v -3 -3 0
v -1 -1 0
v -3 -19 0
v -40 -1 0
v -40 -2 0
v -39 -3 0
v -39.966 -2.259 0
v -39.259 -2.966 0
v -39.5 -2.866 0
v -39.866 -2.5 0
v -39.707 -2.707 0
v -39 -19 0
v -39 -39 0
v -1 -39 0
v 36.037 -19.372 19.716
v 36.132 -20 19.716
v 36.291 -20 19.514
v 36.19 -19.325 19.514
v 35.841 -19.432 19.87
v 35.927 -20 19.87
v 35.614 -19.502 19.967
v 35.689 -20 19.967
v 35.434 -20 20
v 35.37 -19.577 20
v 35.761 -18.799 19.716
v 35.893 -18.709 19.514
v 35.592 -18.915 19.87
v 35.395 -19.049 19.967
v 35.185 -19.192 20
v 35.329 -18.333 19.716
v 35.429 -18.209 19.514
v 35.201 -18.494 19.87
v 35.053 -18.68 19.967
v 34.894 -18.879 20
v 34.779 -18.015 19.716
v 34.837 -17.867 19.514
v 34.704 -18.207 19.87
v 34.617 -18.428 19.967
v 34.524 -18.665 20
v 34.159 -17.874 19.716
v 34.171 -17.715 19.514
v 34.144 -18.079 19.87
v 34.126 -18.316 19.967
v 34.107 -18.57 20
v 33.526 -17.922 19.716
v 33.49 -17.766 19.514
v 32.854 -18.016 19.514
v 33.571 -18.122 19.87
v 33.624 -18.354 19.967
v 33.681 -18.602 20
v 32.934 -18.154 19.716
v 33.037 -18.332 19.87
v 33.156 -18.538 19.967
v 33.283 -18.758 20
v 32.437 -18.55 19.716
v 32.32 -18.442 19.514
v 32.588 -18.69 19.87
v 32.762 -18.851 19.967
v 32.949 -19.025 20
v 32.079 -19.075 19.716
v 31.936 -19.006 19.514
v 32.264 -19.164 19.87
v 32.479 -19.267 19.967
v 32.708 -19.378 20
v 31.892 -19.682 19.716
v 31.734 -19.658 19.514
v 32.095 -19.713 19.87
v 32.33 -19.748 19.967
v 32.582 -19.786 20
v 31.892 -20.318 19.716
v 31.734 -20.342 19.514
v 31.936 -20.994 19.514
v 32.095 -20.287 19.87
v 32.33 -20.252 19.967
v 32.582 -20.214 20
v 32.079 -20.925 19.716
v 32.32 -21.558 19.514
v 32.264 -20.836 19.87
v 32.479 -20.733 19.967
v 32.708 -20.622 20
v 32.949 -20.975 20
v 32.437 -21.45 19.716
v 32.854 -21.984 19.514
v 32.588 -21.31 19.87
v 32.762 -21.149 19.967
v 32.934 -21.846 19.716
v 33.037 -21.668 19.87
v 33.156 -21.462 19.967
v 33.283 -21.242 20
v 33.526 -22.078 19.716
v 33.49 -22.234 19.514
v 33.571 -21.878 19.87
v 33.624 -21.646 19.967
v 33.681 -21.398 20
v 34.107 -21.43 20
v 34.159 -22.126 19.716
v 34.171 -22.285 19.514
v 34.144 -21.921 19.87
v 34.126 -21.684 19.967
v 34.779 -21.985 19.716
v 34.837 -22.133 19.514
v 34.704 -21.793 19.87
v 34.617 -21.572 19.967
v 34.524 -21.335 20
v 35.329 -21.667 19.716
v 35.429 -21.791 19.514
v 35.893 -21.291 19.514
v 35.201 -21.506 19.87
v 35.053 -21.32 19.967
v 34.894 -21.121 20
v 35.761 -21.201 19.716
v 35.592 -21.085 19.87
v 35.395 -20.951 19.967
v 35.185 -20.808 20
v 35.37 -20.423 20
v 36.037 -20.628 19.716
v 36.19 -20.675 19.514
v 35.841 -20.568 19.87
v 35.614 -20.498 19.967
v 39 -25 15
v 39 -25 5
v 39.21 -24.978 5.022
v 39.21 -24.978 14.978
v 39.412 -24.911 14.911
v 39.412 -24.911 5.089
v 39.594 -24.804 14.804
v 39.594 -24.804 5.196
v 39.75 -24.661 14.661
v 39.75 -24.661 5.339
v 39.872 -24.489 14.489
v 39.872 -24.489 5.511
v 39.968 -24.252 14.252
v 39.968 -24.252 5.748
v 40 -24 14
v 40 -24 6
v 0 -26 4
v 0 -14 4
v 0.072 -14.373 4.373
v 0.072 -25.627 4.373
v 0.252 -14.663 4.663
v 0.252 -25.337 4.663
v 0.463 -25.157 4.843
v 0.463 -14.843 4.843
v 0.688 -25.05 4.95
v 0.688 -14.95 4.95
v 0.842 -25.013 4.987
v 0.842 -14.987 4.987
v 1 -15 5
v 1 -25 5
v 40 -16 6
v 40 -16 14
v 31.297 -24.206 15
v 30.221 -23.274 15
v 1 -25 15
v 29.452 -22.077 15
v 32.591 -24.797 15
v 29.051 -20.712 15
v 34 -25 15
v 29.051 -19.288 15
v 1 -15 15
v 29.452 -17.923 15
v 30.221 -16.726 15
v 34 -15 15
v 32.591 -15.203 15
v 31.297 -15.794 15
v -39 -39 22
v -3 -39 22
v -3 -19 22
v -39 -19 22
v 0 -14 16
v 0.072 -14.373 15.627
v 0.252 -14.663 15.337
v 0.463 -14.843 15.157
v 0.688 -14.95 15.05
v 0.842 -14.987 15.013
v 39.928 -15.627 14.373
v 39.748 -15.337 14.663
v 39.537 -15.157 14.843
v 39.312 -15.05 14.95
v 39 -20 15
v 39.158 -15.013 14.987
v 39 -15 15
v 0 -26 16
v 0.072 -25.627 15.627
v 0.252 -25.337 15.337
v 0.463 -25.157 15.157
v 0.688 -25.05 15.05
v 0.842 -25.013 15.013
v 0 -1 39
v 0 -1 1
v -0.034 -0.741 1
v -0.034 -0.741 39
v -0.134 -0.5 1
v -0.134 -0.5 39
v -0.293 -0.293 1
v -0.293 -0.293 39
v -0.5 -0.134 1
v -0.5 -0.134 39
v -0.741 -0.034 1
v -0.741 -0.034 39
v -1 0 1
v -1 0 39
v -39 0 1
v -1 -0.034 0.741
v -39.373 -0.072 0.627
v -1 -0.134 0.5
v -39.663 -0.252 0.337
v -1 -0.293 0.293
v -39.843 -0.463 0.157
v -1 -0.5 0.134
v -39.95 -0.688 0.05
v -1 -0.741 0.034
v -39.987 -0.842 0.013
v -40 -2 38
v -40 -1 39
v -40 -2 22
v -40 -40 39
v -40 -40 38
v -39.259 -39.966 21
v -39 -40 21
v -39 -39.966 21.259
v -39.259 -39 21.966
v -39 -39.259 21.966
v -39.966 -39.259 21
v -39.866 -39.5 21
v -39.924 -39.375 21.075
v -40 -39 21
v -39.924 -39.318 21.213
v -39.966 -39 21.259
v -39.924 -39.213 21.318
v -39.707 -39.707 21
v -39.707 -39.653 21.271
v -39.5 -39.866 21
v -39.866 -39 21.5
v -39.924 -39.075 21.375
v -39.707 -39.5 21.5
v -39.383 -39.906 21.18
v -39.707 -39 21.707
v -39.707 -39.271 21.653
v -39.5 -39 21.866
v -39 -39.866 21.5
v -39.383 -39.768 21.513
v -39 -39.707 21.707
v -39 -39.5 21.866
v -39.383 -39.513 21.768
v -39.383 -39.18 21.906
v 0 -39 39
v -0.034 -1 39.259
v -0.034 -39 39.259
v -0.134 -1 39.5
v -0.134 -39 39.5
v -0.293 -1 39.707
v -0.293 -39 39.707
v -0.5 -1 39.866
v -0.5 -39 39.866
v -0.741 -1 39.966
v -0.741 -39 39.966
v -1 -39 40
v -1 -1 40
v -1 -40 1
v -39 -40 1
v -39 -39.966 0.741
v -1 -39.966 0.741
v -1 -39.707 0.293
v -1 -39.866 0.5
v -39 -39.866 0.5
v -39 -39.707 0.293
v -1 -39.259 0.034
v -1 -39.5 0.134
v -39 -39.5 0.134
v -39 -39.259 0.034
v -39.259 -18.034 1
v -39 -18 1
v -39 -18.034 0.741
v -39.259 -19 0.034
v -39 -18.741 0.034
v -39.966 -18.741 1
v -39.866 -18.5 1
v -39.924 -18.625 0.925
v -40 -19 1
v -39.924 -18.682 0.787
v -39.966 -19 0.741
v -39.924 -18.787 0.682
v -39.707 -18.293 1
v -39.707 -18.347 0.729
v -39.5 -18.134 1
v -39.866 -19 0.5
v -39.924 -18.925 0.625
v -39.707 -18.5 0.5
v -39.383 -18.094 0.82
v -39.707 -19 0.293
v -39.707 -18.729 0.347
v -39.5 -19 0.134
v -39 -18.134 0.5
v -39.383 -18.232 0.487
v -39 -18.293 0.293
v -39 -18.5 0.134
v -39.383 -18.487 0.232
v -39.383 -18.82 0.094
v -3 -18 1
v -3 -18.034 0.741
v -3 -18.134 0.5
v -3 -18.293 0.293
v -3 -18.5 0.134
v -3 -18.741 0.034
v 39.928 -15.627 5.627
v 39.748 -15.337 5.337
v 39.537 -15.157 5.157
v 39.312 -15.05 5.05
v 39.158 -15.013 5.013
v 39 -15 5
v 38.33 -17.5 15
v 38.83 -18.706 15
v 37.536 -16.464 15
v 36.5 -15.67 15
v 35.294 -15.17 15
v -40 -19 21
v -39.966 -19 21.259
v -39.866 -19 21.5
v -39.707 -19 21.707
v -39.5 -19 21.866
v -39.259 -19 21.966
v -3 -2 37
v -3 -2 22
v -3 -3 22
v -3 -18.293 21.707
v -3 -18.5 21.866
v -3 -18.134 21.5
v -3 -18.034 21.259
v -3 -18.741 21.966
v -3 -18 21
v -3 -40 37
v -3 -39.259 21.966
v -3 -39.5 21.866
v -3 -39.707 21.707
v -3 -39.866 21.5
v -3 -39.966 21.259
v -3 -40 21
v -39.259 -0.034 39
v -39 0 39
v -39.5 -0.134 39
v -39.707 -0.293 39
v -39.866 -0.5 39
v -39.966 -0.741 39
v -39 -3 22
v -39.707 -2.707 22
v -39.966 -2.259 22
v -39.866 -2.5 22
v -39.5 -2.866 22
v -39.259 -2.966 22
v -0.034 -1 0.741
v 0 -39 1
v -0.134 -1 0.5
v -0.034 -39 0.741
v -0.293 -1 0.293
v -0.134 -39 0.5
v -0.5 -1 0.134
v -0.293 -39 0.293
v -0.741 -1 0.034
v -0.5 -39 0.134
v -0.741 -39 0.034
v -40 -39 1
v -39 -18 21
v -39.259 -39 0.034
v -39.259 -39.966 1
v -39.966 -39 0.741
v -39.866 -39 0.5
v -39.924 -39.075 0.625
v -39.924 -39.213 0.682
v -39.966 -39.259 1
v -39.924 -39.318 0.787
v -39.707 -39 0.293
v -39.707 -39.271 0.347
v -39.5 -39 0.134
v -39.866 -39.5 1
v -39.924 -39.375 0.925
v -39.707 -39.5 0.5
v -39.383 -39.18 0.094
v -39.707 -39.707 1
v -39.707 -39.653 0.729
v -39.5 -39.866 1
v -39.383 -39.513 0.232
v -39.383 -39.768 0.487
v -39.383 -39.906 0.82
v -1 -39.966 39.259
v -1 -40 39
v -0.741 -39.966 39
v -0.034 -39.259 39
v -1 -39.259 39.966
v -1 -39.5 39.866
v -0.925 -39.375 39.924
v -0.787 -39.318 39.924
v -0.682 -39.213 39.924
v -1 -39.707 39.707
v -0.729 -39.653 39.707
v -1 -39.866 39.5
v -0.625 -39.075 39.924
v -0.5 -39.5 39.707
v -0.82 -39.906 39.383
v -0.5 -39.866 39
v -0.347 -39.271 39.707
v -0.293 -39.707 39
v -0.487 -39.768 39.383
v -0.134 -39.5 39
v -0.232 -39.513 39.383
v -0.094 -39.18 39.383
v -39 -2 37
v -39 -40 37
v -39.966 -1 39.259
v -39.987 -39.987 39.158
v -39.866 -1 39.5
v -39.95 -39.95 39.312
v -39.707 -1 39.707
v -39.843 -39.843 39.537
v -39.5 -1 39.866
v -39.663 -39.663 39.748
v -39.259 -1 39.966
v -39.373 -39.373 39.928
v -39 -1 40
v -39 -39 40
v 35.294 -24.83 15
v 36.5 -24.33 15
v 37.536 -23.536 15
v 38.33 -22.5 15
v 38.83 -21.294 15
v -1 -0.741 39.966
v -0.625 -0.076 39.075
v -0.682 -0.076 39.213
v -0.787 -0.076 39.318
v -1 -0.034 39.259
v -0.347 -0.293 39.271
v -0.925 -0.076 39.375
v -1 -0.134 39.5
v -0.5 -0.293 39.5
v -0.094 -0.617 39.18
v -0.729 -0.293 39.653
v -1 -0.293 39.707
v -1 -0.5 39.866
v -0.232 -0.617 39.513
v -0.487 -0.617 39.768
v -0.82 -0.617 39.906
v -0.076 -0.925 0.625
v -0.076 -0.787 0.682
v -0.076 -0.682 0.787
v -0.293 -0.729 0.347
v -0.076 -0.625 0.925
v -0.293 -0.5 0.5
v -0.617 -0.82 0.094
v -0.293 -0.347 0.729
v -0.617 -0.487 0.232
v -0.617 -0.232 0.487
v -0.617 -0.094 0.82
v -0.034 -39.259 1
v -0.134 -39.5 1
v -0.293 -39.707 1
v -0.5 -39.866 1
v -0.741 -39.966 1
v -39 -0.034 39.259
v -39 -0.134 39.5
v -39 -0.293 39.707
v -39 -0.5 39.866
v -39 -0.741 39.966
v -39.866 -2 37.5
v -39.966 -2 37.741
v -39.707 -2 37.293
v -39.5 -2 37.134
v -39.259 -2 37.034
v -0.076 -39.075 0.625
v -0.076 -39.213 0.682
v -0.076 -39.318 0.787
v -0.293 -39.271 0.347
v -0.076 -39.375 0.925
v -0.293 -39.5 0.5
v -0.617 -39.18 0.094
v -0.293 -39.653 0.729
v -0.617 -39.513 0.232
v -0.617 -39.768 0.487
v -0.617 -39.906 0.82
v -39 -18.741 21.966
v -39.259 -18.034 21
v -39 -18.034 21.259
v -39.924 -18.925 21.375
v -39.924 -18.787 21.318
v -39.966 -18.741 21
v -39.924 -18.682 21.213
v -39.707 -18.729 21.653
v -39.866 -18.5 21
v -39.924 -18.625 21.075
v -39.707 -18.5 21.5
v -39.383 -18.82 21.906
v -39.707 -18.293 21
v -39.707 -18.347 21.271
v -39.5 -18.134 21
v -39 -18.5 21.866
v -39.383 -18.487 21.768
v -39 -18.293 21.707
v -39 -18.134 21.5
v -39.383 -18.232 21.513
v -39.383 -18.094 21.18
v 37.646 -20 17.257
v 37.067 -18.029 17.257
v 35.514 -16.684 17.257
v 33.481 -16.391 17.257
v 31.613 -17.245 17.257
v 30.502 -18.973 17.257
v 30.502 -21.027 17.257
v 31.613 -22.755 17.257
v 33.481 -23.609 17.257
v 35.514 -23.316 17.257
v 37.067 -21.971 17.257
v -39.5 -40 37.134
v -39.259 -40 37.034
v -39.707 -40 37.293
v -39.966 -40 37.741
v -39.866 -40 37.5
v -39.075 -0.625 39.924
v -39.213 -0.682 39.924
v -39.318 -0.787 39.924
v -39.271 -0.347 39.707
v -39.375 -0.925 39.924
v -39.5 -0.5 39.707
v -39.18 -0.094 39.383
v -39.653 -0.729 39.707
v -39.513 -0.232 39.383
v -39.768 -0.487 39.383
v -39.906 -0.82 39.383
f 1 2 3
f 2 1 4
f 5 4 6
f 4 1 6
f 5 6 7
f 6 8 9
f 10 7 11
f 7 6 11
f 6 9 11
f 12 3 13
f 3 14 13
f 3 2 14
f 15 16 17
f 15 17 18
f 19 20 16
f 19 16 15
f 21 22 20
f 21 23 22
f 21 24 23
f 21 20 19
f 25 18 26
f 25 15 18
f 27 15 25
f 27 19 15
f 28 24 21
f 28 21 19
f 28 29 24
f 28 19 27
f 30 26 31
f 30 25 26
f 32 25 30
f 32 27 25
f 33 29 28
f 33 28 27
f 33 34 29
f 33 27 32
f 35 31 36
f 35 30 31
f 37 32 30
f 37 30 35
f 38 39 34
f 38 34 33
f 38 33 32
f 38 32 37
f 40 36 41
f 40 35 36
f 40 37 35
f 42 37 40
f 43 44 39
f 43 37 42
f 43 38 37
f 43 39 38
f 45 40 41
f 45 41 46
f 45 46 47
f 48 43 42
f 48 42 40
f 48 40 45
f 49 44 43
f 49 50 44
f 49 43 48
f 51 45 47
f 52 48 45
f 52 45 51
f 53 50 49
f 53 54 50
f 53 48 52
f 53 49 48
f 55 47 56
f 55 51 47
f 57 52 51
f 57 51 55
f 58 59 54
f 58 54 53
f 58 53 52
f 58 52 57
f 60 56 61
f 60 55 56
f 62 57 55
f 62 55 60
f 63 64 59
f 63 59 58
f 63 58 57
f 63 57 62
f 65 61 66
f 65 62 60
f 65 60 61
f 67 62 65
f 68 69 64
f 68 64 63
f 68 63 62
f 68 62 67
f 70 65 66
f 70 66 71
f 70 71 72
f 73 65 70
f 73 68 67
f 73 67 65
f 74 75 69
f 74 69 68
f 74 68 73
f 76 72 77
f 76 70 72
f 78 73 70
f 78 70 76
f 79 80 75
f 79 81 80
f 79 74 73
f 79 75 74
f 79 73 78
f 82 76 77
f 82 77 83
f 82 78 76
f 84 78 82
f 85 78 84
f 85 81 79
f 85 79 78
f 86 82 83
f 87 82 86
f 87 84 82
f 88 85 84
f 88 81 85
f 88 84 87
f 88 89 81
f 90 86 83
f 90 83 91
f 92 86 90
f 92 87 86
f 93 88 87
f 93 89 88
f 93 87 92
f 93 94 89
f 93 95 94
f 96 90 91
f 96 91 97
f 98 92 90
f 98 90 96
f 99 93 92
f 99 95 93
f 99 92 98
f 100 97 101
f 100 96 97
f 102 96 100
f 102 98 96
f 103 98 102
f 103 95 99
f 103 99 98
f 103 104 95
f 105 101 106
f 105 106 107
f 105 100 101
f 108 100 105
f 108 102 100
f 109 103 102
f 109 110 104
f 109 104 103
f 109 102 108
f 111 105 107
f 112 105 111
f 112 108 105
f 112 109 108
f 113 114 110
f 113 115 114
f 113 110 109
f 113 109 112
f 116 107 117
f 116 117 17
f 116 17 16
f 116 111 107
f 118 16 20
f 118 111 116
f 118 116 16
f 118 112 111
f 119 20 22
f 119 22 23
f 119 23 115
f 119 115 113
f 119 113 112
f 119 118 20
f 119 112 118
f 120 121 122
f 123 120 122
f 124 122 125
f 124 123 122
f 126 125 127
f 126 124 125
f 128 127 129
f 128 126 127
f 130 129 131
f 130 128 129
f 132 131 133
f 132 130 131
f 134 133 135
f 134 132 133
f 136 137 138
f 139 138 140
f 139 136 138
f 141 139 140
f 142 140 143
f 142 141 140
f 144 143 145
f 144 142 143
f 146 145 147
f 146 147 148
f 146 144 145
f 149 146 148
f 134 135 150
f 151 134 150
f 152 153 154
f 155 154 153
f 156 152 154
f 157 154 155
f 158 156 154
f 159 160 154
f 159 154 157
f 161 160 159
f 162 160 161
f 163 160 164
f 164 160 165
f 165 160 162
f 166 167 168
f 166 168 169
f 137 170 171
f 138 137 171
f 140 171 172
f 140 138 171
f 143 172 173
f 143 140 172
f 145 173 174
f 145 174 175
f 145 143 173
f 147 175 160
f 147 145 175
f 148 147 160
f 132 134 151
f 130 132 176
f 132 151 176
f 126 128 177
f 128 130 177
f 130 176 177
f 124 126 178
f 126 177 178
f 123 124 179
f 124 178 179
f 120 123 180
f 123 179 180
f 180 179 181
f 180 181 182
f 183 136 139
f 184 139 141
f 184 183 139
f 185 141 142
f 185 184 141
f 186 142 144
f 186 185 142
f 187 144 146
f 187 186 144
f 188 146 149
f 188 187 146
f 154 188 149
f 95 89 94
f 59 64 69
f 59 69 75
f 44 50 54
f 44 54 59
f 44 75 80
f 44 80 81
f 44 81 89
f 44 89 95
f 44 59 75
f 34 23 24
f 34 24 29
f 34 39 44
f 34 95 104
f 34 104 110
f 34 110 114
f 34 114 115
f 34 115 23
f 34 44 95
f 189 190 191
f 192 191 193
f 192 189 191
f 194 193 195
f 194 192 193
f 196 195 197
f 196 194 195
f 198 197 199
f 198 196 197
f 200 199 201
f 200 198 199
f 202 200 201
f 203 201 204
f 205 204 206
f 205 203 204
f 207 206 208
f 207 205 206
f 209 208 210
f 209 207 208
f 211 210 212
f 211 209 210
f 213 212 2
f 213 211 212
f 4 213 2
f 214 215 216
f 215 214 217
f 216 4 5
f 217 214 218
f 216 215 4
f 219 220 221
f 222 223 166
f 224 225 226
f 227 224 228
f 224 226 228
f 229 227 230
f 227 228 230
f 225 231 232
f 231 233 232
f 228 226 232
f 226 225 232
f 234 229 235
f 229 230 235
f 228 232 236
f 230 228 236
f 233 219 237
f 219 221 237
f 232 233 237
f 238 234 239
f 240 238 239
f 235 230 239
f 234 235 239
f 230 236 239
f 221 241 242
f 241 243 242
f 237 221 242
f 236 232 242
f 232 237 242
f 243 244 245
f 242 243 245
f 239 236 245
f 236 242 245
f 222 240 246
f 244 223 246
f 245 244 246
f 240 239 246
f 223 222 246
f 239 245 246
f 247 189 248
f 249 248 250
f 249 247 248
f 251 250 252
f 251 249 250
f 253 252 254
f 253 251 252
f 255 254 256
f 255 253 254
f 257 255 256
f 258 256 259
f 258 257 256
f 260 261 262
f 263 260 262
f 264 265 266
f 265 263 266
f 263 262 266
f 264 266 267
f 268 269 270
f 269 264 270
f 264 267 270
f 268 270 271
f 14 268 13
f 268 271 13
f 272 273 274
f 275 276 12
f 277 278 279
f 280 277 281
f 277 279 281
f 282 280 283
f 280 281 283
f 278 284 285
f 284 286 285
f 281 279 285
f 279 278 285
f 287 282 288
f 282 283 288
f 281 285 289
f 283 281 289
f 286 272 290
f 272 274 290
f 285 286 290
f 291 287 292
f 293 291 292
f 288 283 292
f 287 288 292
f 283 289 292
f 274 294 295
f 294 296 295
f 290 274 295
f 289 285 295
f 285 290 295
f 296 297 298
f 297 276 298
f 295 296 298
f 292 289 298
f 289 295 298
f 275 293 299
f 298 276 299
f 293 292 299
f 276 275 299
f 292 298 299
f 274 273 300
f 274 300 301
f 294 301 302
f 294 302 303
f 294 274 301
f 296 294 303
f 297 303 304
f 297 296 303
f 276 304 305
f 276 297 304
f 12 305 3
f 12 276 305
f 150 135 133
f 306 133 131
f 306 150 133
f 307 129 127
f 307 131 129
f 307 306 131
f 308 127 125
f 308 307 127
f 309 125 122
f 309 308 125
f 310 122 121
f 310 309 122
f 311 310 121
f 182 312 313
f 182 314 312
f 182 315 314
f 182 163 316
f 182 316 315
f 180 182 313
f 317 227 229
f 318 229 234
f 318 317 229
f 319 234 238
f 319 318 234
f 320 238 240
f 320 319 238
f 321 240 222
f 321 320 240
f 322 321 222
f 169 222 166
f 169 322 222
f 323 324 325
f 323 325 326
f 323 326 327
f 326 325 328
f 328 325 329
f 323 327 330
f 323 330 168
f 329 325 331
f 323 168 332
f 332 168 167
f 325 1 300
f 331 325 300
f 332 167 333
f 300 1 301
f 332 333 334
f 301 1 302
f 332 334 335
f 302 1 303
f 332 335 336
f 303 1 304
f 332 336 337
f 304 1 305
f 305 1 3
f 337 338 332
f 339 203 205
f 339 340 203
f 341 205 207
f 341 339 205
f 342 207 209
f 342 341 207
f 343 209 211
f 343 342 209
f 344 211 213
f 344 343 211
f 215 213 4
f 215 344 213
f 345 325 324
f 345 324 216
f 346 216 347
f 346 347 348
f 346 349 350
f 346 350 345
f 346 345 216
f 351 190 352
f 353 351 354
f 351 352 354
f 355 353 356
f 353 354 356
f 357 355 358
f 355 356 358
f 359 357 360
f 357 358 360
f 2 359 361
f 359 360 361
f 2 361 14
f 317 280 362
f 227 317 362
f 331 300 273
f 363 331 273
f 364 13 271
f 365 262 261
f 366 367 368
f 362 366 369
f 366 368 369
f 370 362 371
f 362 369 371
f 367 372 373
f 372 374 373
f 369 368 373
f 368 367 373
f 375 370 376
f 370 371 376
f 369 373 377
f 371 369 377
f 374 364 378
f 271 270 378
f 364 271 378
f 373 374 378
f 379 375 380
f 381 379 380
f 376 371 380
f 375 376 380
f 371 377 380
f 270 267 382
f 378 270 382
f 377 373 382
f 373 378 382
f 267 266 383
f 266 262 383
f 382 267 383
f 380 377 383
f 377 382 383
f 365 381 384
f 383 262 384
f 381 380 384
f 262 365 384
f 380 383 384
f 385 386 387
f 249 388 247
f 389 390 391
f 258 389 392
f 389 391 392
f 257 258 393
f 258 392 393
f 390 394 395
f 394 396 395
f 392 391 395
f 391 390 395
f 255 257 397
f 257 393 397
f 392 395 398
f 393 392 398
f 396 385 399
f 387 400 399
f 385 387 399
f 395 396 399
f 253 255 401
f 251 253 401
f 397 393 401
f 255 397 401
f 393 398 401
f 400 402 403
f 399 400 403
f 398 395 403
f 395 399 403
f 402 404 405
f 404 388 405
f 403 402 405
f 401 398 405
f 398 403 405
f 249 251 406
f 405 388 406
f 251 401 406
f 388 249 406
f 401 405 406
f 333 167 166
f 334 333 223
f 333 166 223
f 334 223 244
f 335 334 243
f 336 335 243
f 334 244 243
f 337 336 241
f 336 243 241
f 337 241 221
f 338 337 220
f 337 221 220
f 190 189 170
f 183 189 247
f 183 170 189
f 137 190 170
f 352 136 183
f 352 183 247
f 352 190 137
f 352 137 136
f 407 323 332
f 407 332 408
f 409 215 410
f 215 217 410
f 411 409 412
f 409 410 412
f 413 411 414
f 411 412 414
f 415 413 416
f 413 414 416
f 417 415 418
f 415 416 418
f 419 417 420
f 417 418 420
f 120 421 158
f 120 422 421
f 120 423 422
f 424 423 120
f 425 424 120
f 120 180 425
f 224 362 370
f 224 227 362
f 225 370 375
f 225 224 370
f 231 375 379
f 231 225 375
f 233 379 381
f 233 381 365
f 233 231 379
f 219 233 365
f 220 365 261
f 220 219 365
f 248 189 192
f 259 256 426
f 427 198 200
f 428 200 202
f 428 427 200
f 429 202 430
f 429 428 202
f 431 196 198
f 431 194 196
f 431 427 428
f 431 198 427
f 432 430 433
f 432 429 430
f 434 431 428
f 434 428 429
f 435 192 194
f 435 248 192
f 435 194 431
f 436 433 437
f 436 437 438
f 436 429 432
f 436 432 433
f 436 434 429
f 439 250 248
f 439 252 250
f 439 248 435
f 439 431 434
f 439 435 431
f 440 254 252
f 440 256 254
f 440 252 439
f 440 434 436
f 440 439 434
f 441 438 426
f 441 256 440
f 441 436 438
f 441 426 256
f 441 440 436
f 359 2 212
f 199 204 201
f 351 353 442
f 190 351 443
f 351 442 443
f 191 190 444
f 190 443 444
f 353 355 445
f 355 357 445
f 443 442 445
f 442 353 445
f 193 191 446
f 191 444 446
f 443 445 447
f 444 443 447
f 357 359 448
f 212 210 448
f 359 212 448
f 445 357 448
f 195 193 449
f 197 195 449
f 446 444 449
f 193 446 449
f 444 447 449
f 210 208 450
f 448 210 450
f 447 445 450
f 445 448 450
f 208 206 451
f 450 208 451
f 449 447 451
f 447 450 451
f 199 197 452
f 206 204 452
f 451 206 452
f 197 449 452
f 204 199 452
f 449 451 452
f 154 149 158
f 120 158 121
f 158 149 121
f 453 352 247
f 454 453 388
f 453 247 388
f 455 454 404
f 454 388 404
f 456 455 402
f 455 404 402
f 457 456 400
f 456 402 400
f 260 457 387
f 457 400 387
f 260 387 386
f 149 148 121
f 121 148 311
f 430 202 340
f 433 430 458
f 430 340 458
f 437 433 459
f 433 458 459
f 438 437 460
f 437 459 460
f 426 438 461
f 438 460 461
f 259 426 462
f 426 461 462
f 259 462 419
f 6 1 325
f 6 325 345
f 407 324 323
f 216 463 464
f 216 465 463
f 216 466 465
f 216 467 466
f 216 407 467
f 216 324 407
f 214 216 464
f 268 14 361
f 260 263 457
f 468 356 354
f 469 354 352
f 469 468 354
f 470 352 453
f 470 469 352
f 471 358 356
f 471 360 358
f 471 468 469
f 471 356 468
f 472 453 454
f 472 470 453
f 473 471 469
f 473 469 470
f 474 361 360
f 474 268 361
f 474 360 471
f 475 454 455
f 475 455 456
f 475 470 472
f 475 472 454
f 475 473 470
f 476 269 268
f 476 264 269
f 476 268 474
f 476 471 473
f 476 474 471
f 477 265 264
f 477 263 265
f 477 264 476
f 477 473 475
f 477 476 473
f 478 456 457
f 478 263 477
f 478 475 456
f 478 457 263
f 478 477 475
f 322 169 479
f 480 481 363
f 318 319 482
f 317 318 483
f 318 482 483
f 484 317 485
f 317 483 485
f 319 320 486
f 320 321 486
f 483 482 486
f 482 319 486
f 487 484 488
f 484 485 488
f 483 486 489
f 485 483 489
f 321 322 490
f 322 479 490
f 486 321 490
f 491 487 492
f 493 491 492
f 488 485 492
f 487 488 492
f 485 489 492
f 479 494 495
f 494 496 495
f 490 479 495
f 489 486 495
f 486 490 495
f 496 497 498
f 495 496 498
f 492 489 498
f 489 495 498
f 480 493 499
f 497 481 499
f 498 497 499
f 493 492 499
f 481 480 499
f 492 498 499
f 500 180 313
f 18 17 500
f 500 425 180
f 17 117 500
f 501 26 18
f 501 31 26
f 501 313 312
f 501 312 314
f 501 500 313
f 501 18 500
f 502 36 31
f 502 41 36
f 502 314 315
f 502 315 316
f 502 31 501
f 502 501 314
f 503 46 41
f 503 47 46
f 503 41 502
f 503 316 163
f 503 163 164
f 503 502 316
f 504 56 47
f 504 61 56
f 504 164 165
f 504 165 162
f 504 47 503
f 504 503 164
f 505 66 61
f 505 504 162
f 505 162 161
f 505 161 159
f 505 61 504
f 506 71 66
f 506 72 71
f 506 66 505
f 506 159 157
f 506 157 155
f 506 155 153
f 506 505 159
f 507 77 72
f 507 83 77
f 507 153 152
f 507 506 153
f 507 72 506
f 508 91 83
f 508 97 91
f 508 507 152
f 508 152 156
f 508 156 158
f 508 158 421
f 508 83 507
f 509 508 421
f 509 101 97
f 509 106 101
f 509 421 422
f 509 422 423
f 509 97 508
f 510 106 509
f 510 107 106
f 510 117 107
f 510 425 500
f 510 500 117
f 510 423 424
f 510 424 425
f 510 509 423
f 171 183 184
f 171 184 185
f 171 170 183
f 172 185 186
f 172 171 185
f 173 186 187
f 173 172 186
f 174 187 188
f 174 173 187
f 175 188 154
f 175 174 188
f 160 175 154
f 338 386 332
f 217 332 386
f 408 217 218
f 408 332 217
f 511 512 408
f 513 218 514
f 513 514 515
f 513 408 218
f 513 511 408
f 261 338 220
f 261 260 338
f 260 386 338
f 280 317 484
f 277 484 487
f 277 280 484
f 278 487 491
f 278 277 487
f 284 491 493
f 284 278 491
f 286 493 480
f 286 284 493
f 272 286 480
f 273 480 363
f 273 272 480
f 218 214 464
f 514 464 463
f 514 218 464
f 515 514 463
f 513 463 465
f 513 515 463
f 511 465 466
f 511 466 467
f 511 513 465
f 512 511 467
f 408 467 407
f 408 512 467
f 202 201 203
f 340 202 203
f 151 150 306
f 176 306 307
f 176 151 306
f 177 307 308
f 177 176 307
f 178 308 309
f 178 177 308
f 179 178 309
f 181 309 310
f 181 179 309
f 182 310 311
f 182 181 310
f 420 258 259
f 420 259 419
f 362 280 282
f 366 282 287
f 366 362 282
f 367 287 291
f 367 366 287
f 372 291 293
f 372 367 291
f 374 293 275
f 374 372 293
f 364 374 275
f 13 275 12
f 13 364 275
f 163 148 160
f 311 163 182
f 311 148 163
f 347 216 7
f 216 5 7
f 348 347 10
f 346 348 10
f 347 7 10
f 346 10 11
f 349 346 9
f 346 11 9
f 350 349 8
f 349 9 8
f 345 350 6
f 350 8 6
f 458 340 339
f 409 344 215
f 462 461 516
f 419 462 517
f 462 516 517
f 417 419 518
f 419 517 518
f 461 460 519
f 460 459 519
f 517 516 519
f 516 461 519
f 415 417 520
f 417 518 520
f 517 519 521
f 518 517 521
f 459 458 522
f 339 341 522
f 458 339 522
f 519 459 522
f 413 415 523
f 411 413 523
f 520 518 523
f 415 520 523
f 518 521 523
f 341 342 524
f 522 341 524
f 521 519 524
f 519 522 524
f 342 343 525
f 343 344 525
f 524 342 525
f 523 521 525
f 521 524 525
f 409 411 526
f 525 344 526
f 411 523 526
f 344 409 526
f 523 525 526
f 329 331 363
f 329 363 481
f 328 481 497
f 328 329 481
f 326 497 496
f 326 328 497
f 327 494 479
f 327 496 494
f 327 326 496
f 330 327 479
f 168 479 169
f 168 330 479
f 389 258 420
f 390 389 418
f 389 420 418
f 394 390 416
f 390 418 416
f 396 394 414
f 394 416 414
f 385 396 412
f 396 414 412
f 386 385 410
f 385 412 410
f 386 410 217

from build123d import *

# Parameters (mm, degrees)
FILLET008_R               = 1
BOX003_W                  = 40
BOX003_H                  = 10
BOX003_DEPTH              = 10
FILLET007_R               = 1
BOX002_W                  = 39
BOX002_H                  = 15
BOX002_DEPTH              = 37
BOX001_W                  = 39
BOX001_H                  = 39
BOX001_DEPTH              = 15
BOX_W                     = 40
BOX_H                     = 40
BOX_DEPTH                 = 40
FILLET_R                  = 1
FILLET001_R               = 1
FILLET002_R               = 1
FILLET003_R               = 1
FILLET004_R               = 1
FILLET005_R               = 1
FILLET006_R               = 1
FILLET006_PLACEMENT_ANGLE = 180
FILLET009_R               = 1
FILLET010_R               = 1
FILLET011_R               = 1
FILLET012_R               = 1


with BuildPart() as fillet008:
    # Cone → Cone (revolve)
    with BuildSketch(Plane(origin=(35, -20, 15), x_dir=(1, 0, 0), z_dir=(0, -1, 0))):
        Polygon((0, 0), (5, 0), (2, 5), (0, 5), align=None)
    revolve(axis=Axis((35, -20, 15), (0, 0, 1)))

    # Fillet008
    fillet008_edges = [fillet008.edges().sort_by_distance(p)[0] for p in [
        (33, -20, 20),
    ]]
    fillet(fillet008_edges, radius=FILLET008_R)


with BuildPart() as fillet008_1:
    # Fillet008 placement: moved
    add(fillet008.part.moved(Location((-1, 0, 0))))


with BuildPart() as fillet007:
    # Box003 → Box003 (new body)
    with BuildSketch(Plane(origin=(0, -25, 5), x_dir=(1, 0, 0), z_dir=(0, 0, 1))):
        with Locations((20, 5)):
            Rectangle(BOX003_W, BOX003_H)
    extrude(amount=BOX003_DEPTH)

    # Fillet007
    fillet007_edges = [fillet007.edges().sort_by_distance(p)[0] for p in [
        (40, -25, 10),
        (40, -20, 15),
        (40, -15, 10),
        (40, -20, 5),
    ]]
    fillet(fillet007_edges, radius=FILLET007_R)


with BuildPart() as cube002:
    # Box002 → Box002 (new body)
    with BuildSketch(Plane(origin=(3, 3, 0), x_dir=(1, 0, 0), z_dir=(0, 0, 1))):
        with Locations((19.5, 7.5)):
            Rectangle(BOX002_W, BOX002_H)
    extrude(amount=BOX002_DEPTH)


with BuildPart() as cube001:
    # Box001 → Box001 (new body)
    with BuildSketch(Plane(origin=(3, 2, 22), x_dir=(1, 0, 0), z_dir=(0, 0, 1))):
        with Locations((19.5, 19.5)):
            Rectangle(BOX001_W, BOX001_H)
    extrude(amount=BOX001_DEPTH)


with BuildPart() as fusion001:
    # Box → Box (new body)
    with BuildSketch(Plane.XY):
        with Locations((20, 20)):
            Rectangle(BOX_W, BOX_H)
    extrude(amount=BOX_DEPTH)

    # Cut: cut Cube001
    add(cube001.part, mode=Mode.SUBTRACT)

    # Cut001: cut Cube002
    add(cube002.part, mode=Mode.SUBTRACT)

    # Fillet
    fillet_edges = [fusion001.edges().sort_by_distance(p)[0] for p in [
        (21.5, 18, 22),
    ]]
    fillet(fillet_edges, radius=FILLET_R)

    # Fillet001
    fillet001_edges = [fusion001.edges().sort_by_distance(p)[0] for p in [
        (21.5, 18, 0),
    ]]
    fillet(fillet001_edges, radius=FILLET001_R)

    # Fillet002
    fillet002_edges = [fusion001.edges().sort_by_distance(p)[0] for p in [
        (20, 40, 0),
        (21.5, 40, 22),
    ]]
    fillet(fillet002_edges, radius=FILLET002_R)

    # Fillet003
    fillet003_edges = [fusion001.edges().sort_by_distance(p)[0] for p in [
        (20, 0, 0),
        (0, 40, 20.5),
        (20, 40, 40),
        (0, 20, 40),
        (0, 0, 20),
        (40, 0, 20),
        (20, 0, 40),
        (40, 20, 40),
    ]]
    fillet(fillet003_edges, radius=FILLET003_R)

    # Fillet004
    fillet004_edges = [fusion001.edges().sort_by_distance(p)[0] for p in [
        (40, 3, 11),
    ]]
    fillet(fillet004_edges, radius=FILLET004_R)

    # Fillet005
    fillet005_edges = [fusion001.edges().sort_by_distance(p)[0] for p in [
        (40, 21, 37),
    ]]
    fillet(fillet005_edges, radius=FILLET005_R)

    # Fillet006
    fillet006_edges = [fusion001.edges().sort_by_distance(p)[0] for p in [
        (40, 40, 11),
        (40, 29, 0),
        (40, 29, 22),
        (40, 18, 11),
    ]]
    fillet(fillet006_edges, radius=FILLET006_R)


with BuildPart() as fusion001_1:
    # Fillet006 placement: moved
    add(fusion001.part.rotate(Axis((0, 0, 0), (0, 0, 1)), FILLET006_PLACEMENT_ANGLE))

    # Fusion: union Fillet007
    add(fillet007.part)

    # Fillet009
    fillet009_edges = [fusion001_1.edges().sort_by_distance(p)[0] for p in [
        (0, -20, 15),
    ]]
    fillet(fillet009_edges, radius=FILLET009_R)

    # Fillet010
    fillet010_edges = [fusion001_1.edges().sort_by_distance(p)[0] for p in [
        (0, -15, 10),
    ]]
    fillet(fillet010_edges, radius=FILLET010_R)

    # Fillet011
    fillet011_edges = [fusion001_1.edges().sort_by_distance(p)[0] for p in [
        (0, -25, 10),
    ]]
    fillet(fillet011_edges, radius=FILLET011_R)

    # Fillet012
    fillet012_edges = [fusion001_1.edges().sort_by_distance(p)[0] for p in [
        (0, -20, 5),
    ]]
    fillet(fillet012_edges, radius=FILLET012_R)

    # Fusion001: union Fillet008
    add(fillet008_1.part)


solid = fusion001_1.part
